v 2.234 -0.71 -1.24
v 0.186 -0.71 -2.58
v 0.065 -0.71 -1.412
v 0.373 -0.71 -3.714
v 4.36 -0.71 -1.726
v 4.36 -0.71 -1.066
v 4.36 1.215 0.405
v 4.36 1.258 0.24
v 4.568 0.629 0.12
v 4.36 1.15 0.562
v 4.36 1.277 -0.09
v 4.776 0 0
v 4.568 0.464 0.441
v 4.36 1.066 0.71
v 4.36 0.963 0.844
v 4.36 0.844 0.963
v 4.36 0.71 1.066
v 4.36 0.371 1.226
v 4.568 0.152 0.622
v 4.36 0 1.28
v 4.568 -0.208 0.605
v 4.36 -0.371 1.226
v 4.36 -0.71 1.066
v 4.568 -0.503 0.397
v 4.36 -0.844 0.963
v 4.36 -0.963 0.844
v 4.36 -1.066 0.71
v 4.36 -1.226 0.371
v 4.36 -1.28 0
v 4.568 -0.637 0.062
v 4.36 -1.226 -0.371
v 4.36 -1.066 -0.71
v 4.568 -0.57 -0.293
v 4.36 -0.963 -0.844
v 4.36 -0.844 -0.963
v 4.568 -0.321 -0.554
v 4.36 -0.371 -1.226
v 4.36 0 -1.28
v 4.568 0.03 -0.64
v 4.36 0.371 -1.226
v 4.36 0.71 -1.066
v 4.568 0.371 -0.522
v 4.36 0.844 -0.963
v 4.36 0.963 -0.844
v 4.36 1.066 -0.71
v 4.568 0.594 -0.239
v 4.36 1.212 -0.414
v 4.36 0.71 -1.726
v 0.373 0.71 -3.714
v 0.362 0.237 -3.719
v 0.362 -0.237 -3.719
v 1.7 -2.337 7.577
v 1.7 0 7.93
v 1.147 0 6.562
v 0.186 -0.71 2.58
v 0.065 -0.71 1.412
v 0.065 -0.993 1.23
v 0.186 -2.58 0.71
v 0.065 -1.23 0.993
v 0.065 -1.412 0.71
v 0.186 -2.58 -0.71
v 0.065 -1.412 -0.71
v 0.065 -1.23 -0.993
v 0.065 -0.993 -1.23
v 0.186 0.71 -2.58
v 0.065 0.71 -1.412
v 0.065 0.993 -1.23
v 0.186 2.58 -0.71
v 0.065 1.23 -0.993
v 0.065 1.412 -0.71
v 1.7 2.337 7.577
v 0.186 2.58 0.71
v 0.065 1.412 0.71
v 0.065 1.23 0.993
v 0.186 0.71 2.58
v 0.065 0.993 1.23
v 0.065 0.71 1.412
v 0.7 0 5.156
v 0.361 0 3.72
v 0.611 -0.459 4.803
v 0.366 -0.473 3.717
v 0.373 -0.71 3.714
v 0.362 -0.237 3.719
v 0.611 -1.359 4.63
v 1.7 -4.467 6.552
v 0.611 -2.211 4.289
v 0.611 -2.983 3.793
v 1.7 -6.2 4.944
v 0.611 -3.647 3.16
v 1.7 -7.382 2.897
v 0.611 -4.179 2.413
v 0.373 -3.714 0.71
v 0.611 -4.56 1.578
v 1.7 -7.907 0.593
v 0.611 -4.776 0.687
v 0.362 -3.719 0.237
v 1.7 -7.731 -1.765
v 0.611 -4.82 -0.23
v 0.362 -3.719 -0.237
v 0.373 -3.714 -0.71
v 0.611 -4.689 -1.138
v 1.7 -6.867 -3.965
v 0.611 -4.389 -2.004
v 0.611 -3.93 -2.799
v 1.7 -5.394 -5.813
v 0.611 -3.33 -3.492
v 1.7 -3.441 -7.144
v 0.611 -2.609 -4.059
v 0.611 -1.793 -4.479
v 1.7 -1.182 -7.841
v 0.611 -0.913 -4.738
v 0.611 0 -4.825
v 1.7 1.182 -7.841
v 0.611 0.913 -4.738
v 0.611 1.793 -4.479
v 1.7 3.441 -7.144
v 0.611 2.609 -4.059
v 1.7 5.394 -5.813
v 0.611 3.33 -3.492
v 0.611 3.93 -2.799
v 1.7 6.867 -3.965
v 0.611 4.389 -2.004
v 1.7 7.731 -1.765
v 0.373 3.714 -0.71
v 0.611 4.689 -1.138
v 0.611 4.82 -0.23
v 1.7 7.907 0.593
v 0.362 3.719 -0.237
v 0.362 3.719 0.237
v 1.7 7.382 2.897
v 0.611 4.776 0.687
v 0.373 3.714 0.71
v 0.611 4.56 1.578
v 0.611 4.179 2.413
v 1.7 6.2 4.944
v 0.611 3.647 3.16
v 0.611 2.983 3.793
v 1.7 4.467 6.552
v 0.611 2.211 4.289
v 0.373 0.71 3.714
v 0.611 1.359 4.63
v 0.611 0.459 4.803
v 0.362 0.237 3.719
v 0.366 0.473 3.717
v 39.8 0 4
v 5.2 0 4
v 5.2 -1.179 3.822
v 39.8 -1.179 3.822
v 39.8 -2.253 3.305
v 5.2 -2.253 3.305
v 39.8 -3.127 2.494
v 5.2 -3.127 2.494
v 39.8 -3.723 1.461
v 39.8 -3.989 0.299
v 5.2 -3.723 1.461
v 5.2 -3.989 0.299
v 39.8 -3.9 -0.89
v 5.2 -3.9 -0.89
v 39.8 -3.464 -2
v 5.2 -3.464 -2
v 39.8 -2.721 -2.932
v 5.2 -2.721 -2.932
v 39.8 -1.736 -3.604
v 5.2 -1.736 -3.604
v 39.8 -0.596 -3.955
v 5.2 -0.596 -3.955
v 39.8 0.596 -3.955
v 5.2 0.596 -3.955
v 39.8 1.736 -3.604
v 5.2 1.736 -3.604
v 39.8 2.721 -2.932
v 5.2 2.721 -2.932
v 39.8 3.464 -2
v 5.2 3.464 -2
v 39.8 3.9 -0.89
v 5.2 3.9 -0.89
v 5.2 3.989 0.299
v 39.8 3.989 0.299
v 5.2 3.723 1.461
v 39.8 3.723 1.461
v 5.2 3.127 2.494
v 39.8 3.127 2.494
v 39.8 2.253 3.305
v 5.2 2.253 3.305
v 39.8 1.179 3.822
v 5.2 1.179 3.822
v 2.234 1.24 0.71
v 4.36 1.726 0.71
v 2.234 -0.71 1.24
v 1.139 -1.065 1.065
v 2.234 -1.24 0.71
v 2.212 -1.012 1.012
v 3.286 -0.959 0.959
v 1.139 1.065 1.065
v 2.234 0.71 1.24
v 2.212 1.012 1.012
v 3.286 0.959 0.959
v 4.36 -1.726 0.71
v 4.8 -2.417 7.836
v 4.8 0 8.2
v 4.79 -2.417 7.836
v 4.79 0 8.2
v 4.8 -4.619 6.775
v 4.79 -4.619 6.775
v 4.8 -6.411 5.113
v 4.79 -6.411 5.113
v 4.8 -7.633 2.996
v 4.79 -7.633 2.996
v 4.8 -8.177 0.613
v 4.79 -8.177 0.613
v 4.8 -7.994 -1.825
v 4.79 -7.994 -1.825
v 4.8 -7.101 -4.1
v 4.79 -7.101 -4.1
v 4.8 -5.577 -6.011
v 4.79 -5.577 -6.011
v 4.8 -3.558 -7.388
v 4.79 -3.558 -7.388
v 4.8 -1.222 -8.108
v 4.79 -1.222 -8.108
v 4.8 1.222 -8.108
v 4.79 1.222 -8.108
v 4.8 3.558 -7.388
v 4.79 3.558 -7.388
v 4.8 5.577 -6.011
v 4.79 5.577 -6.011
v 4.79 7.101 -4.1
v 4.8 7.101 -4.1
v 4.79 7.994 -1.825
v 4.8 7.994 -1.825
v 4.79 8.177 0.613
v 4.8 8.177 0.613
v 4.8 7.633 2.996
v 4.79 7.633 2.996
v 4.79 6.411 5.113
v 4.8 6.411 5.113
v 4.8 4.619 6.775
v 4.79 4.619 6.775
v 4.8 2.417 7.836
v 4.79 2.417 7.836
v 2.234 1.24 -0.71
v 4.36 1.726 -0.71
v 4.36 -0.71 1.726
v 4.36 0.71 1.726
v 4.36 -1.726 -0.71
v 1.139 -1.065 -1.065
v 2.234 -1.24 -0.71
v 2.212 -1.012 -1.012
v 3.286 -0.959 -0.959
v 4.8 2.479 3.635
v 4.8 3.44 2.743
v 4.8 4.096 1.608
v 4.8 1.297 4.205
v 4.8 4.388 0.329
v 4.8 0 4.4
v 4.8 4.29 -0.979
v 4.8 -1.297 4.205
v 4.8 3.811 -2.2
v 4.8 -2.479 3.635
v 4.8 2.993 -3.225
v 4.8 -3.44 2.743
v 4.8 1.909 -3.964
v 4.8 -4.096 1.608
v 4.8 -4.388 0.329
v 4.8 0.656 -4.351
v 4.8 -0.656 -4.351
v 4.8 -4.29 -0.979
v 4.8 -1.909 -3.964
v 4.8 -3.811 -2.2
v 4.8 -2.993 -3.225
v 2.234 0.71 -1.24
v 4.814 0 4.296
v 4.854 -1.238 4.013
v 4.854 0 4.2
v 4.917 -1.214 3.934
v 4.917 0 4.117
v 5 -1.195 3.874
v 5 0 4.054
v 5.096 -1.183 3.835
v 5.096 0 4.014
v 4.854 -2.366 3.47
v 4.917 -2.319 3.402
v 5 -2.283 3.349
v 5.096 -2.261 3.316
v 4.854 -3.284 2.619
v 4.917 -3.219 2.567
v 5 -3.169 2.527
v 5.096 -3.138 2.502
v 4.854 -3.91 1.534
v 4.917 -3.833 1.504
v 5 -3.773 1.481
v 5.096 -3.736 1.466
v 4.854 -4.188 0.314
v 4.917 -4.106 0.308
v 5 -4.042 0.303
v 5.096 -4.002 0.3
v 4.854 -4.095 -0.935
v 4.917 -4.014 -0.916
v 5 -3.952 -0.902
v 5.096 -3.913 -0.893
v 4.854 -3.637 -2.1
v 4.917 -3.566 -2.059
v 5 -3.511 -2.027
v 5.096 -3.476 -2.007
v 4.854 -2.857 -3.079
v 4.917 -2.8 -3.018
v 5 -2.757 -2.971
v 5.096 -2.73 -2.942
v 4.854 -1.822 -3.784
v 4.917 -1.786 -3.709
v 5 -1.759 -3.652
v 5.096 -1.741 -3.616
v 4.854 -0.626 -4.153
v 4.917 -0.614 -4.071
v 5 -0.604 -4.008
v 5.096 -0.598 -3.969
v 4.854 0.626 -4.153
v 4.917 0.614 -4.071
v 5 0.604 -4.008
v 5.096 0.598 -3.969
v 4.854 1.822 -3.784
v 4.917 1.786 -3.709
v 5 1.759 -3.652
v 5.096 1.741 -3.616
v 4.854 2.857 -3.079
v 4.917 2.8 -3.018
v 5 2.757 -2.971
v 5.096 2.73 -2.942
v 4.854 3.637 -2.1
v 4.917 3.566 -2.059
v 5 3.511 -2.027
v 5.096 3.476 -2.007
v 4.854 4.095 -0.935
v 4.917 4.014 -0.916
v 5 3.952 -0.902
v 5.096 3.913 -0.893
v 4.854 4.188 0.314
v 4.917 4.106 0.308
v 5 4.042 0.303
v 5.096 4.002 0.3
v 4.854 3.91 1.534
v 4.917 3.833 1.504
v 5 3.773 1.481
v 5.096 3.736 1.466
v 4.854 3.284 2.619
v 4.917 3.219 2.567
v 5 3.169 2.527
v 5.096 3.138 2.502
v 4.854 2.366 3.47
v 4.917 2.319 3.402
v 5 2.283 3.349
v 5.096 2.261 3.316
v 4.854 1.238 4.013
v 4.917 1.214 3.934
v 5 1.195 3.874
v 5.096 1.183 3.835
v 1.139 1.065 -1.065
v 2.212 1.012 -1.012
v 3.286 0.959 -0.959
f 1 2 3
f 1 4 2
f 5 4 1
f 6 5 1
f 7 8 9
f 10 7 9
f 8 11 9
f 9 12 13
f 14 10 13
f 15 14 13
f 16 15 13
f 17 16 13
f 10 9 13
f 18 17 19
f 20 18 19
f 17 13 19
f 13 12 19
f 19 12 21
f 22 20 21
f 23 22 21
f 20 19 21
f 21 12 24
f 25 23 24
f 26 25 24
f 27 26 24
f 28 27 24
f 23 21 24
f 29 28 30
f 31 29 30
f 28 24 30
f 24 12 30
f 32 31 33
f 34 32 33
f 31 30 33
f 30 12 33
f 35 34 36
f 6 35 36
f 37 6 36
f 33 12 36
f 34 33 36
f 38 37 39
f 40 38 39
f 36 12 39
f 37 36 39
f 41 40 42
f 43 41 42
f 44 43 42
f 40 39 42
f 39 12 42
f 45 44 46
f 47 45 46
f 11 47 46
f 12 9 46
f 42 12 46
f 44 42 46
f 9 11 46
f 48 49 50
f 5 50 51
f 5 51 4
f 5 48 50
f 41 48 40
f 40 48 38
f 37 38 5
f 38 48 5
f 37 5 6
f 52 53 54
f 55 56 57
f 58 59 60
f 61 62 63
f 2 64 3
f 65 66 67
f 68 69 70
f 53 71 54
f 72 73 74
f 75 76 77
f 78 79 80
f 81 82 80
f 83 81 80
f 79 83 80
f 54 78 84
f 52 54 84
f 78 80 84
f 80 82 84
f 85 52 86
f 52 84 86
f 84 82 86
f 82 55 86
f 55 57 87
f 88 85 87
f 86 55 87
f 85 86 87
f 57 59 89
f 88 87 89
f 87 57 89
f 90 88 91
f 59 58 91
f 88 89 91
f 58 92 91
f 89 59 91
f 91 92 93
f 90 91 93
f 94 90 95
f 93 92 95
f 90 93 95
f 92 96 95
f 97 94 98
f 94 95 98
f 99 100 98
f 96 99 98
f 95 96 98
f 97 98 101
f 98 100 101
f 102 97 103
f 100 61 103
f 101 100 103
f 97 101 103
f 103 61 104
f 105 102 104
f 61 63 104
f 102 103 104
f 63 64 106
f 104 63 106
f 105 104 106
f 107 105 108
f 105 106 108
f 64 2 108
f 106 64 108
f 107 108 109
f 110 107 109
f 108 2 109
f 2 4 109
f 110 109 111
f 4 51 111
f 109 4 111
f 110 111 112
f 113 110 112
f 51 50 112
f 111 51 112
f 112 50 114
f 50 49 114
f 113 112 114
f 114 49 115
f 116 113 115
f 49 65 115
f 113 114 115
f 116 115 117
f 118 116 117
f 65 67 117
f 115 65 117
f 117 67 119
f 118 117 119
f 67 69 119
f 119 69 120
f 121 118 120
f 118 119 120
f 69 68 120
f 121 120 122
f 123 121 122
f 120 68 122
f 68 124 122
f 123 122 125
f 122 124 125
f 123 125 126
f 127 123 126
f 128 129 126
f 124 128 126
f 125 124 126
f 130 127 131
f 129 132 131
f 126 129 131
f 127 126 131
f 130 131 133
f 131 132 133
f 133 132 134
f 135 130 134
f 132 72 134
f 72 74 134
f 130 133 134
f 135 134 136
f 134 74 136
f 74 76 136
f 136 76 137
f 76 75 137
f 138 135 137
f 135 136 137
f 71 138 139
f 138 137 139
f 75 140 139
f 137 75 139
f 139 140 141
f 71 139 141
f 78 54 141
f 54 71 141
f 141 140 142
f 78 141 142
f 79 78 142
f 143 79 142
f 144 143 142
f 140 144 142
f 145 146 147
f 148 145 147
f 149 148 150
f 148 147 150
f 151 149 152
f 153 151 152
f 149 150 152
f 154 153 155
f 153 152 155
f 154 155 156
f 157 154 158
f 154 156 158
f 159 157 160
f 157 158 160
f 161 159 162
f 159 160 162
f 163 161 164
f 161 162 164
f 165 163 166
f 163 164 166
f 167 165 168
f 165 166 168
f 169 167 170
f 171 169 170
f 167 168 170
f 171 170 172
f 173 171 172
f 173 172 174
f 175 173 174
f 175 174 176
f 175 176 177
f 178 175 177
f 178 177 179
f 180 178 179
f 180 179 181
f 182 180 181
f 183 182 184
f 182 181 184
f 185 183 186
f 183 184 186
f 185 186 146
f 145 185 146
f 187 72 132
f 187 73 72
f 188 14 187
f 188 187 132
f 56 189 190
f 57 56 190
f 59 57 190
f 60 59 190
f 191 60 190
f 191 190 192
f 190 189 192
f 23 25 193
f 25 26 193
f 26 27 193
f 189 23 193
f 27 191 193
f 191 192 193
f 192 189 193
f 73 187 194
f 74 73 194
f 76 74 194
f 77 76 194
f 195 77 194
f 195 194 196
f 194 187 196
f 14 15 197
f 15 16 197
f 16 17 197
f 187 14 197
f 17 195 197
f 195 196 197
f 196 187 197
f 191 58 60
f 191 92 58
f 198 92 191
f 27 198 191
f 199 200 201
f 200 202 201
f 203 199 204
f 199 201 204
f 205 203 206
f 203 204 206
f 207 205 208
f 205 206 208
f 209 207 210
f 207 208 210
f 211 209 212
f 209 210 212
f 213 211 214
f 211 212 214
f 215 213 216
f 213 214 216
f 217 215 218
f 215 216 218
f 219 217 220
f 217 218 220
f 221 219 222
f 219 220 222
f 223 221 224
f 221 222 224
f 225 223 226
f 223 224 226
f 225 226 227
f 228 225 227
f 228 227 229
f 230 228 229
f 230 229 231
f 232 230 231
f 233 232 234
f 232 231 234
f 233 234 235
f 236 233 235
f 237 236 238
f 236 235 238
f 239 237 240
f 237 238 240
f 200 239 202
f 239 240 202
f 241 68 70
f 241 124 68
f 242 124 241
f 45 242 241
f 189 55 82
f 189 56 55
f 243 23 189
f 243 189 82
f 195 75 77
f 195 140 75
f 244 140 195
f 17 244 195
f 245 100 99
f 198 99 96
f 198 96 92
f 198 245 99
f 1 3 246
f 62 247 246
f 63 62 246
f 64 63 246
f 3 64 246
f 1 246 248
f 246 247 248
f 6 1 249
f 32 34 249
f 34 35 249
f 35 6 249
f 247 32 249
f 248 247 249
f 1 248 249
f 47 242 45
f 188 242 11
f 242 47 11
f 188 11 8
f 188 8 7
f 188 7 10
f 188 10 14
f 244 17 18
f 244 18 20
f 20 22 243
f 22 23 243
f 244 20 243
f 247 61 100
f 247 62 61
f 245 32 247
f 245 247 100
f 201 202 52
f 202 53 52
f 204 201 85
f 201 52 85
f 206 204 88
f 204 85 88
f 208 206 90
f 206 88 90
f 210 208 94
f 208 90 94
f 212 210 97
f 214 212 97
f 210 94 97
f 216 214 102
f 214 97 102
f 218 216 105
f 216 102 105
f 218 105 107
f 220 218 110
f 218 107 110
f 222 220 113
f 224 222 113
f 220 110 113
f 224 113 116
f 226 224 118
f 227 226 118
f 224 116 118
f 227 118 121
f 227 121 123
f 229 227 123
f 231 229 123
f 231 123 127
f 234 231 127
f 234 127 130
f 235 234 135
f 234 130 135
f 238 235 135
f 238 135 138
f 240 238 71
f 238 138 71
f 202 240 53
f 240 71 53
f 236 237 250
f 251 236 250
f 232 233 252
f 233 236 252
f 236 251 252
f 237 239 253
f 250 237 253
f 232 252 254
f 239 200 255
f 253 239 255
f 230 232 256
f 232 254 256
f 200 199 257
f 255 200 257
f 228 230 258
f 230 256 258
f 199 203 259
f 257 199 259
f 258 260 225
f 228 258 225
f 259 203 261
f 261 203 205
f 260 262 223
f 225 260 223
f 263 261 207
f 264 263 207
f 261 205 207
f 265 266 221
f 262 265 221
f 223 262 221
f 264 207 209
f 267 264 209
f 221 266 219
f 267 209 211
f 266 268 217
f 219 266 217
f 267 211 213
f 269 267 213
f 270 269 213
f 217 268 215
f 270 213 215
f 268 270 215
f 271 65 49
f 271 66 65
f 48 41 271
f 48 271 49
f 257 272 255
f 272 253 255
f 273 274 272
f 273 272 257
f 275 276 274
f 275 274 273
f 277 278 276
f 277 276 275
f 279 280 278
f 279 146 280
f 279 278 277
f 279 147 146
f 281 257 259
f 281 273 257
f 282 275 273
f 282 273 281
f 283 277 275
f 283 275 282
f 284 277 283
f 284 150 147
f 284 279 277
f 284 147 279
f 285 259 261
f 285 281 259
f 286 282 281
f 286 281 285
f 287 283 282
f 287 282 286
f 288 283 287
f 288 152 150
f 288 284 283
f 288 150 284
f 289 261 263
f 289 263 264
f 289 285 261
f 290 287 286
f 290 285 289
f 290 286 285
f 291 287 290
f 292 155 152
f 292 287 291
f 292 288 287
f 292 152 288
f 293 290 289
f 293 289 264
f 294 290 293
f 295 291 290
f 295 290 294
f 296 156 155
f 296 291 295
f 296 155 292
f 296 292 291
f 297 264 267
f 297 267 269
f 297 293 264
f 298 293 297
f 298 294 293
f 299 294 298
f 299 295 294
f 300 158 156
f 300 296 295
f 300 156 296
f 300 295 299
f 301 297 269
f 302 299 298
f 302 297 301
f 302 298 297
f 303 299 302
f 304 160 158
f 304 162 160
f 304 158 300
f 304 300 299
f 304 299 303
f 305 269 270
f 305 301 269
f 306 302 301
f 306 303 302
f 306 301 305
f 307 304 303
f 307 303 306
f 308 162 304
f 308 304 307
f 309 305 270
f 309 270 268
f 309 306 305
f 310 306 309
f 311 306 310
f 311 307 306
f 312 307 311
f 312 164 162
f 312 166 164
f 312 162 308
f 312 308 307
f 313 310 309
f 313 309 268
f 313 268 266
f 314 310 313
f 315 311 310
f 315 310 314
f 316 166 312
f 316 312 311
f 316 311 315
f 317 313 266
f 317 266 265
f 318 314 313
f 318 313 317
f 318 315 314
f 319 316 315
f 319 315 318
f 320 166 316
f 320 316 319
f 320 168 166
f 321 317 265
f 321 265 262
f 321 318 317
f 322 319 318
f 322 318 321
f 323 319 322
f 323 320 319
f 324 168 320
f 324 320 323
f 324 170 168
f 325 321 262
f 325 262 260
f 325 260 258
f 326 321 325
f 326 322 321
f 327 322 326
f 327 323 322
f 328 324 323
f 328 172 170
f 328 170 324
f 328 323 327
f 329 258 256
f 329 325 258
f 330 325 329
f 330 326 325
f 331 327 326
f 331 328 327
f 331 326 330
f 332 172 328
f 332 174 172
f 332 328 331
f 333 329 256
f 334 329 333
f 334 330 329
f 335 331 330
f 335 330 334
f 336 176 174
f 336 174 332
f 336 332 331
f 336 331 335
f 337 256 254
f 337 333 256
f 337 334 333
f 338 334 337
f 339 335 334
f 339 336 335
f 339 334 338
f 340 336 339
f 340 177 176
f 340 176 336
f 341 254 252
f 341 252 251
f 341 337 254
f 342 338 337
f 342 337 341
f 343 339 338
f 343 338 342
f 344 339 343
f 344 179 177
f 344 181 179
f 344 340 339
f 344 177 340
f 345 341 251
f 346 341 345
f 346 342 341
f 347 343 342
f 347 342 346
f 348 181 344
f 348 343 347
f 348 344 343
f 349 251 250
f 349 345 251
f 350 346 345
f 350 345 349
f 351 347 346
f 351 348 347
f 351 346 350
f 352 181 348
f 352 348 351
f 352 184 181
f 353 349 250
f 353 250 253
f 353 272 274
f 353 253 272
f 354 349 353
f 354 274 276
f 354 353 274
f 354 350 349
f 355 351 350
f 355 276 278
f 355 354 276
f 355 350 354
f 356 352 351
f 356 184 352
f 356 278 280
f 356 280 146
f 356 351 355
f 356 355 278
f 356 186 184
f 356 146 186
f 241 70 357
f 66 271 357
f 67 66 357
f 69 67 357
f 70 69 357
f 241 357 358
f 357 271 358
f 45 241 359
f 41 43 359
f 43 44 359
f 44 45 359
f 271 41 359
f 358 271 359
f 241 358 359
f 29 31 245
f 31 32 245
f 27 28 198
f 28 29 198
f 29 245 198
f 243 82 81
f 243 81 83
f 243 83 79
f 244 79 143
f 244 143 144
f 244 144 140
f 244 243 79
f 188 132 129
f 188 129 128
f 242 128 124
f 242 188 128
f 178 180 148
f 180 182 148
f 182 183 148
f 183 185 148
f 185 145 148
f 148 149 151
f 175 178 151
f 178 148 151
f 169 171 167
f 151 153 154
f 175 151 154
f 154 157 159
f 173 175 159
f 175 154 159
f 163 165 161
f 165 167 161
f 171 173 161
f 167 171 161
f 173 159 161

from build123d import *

# Parameters (mm, degrees)
FILLET1_R    = 0.4
RECPAT_COUNT = 2
RECPAT_ANGLE = 90


with BuildPart() as part:
    # BodySke → Base-Revolve (revolve)
    with BuildSketch(Plane.XY, mode=Mode.PRIVATE) as base_revolve_sk:
        with BuildLine():
            Line((4.8, 4), (4.8, 8.2))
            Line((4.8, 8.2), (4.79, 8.2))
            Line((4.79, 8.2), (1.7, 7.92966003))
            ThreePointArc((1.7, 7.92966003), (0.429774249, 4.054920104), (0, 0))
            Line((0, 0), (39.8, 0))
            Line((39.8, 0), (39.8, 4))
            Line((39.8, 4), (4.8, 4))
        make_face()
    revolve(base_revolve_sk.sketch.rotate(Axis((1.7, 0, 0), (1, 0, 0)), 90), axis=Axis((1.7, 0, 0), (1, 0, 0)))

    # Fillet1
    fillet1_edges = [part.edges().sort_by_distance(p)[0] for p in [
        (4.8, 0, -4),
    ]]
    fillet(fillet1_edges, radius=FILLET1_R)

    # Sketch3 → Recess section 0
    with BuildSketch(Plane(origin=(0, 0, 0), x_dir=(0, 0, -1), z_dir=(1, 0, 0))):
        with BuildLine():
            Line((0.71, -3.9), (-0.71, -3.9))
            Line((-0.71, -3.9), (-0.71, 3.9))
            Line((-0.71, 3.9), (0.71, 3.9))
            Line((0.71, 3.9), (0.71, -3.9))
        make_face()
    # Sketch4 → Recess section 1
    with BuildSketch(Plane(origin=(4.36, 0, 0), x_dir=(0, 0, -1), z_dir=(1, 0, 0))):
        with BuildLine():
            Line((0.71, -1.726184552), (-0.71, -1.726184552))
            Line((-0.71, -1.726184552), (-0.71, 1.726184552))
            Line((-0.71, 1.726184552), (0.71, 1.726184552))
            Line((0.71, 1.726184552), (0.71, -1.726184552))
        make_face()
    recess = loft(mode=Mode.SUBTRACT)

    # RecPat: Recess ×2 about axis
    recpat_axis = Axis((0, 0, 0), (1, 0, 0))
    for i in range(1, RECPAT_COUNT):
        add(recess.rotate(recpat_axis, i * RECPAT_ANGLE / (RECPAT_COUNT - 1)), mode=Mode.SUBTRACT)

    # RecCorSke → RecessCore (revolve, cut)
    with BuildSketch(Plane.XY, mode=Mode.PRIVATE) as recesscore_sk:
        Polygon((0, 0), (0, 1.5853809), (4.36, 1.2805), (4.776059671, 0), align=None)
    revolve(recesscore_sk.sketch.rotate(Axis((-3.175, 0, 0), (1, 0, 0)), 10.822716804), axis=Axis((-3.175, 0, 0), (1, 0, 0)), mode=Mode.SUBTRACT)


solid = part.part
